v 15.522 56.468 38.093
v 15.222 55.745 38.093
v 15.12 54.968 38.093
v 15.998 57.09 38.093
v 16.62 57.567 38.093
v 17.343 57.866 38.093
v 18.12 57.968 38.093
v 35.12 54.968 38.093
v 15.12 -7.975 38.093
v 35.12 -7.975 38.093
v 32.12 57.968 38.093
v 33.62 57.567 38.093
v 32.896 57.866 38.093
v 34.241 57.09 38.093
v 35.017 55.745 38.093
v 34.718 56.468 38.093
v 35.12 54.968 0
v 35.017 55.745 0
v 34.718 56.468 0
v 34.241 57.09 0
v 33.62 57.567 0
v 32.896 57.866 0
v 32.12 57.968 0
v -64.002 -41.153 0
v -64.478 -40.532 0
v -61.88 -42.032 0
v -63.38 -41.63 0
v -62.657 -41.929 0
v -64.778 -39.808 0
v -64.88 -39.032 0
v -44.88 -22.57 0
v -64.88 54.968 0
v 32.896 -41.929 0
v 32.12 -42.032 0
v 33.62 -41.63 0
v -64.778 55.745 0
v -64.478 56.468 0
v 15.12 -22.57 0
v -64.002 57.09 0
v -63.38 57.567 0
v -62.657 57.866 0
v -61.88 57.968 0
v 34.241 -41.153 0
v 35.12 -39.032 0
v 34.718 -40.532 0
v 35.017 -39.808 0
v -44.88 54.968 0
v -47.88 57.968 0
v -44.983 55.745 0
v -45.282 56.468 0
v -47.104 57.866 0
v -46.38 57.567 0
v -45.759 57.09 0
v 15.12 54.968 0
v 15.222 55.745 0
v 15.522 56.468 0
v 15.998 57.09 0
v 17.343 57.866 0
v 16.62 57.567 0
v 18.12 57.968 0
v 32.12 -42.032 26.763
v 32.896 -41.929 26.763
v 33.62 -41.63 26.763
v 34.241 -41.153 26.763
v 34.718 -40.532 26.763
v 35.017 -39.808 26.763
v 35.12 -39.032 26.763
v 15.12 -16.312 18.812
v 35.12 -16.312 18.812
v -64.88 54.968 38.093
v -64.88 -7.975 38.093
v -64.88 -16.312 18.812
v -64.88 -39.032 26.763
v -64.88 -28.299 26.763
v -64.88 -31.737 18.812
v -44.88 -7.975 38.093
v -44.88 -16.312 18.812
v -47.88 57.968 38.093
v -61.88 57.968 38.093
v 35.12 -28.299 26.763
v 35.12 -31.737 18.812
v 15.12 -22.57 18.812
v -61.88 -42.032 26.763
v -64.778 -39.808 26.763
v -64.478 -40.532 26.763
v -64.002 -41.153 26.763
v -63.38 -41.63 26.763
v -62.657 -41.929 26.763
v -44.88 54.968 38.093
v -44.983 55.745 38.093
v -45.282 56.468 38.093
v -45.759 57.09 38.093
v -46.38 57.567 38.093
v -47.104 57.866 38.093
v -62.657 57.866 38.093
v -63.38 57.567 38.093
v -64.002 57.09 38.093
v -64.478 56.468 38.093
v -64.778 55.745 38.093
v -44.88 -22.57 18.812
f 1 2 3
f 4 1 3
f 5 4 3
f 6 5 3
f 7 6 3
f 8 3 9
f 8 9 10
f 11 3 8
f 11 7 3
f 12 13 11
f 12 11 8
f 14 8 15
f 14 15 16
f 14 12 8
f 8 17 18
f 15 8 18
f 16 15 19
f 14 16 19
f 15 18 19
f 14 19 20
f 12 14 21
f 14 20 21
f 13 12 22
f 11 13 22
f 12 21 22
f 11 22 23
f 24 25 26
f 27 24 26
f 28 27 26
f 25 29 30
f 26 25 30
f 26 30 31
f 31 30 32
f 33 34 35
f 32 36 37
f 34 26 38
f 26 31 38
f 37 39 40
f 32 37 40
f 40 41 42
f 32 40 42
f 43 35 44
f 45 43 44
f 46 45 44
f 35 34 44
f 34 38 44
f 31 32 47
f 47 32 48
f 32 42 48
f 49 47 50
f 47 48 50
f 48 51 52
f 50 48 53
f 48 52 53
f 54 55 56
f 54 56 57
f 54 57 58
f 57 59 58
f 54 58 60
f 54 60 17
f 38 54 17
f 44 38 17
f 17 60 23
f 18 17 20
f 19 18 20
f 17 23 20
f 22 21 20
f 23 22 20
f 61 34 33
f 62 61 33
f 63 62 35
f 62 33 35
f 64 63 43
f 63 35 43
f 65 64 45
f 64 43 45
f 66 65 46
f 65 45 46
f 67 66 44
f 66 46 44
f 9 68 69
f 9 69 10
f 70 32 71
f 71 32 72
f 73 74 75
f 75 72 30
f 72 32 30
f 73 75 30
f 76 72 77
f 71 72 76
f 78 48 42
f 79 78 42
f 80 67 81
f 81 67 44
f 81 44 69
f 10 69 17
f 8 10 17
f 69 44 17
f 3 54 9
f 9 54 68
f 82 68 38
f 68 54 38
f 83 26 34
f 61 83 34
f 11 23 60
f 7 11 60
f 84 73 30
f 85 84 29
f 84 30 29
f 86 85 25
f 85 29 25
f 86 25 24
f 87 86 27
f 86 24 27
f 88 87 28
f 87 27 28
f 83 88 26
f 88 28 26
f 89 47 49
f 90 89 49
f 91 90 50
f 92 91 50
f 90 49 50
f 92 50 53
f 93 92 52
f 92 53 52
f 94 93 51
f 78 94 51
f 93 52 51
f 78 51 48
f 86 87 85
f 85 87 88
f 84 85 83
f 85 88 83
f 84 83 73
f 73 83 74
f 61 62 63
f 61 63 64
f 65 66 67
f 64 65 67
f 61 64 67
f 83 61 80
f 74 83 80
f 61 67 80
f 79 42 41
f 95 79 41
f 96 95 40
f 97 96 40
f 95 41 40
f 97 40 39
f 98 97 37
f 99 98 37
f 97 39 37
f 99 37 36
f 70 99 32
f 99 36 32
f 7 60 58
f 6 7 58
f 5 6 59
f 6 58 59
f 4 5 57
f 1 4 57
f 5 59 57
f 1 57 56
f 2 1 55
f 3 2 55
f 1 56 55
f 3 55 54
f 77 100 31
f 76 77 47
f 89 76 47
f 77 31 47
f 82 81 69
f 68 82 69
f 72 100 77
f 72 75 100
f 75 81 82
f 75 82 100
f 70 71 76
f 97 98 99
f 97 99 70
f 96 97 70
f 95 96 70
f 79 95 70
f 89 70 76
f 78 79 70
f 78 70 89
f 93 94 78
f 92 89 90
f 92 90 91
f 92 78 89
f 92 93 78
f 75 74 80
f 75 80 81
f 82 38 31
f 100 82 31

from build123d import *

# Parameters (mm, degrees)
F1_DEPTH = 38.09291
F3_DEPTH = 122.48907
F6_W     = 30.103382
F6_H     = 15.981055
F7_DEPTH = 76.09144


with BuildPart() as f1:
    # F0 (on Top) → F1 (new body)
    with BuildSketch(Plane.XY):
        with BuildLine():
            Line((-47.8804, 57.96845), (-61.8804, 57.96845))
            ThreePointArc((-61.8804, 57.96845), (-64.00172, 57.089771), (-64.8804, 54.96845))
            Line((-64.8804, 54.96845), (-64.8804, -39.03155))
            ThreePointArc((-64.8804, -39.03155), (-64.00172, -41.15287), (-61.8804, -42.03155))
            Line((-61.8804, -42.03155), (32.1196, -42.03155))
            ThreePointArc((32.1196, -42.03155), (34.240921, -41.15287), (35.1196, -39.03155))
            Line((35.1196, -39.03155), (35.1196, 54.96845))
            ThreePointArc((35.1196, 54.96845), (34.240921, 57.089771), (32.1196, 57.96845))
            Line((32.1196, 57.96845), (18.1196, 57.96845))
            ThreePointArc((18.1196, 57.96845), (15.99828, 57.089771), (15.1196, 54.96845))
            Line((15.1196, 54.96845), (15.1196, -22.569584))
            Line((15.1196, -22.569584), (-44.8804, -22.569584))
            Line((-44.8804, -22.569584), (-44.8804, 54.96845))
            ThreePointArc((-44.8804, 54.96845), (-45.759079, 57.089771), (-47.8804, 57.96845))
        make_face()
    extrude(amount=F1_DEPTH)


with BuildPart() as f3:
    # F2 (on Right) → F3 (new body)
    with BuildSketch(Plane.YZ):
        Polygon((-71.411475, 51.98656), (-86.8368, 51.98656), (-102.24022, 16.366137), (-86.814895, 16.366137), align=None)
    extrude(amount=F3_DEPTH)


with BuildPart() as f3_1:
    # F4: moved
    add(f3.part.moved(Location((-76.72278, 70.50282, 2.4462))))


with BuildPart() as f1_1:
    add(f1.part)

    # F5: cut F3
    add(f3_1.part, mode=Mode.SUBTRACT)


with BuildPart() as f7:
    # F6 (on Right) → F7 (new body, symmetric)
    with BuildSketch(Plane.YZ):
        with Locations((-78.402916, 34.753974)):
            Rectangle(F6_W, F6_H)
    extrude(amount=F7_DEPTH, both=True)


with BuildPart() as f7_1:
    # F8: moved
    add(f7.part.moved(Location((0, 44.64814, 0))))


with BuildPart() as f1_2:
    add(f1_1.part)

    # F9: cut F7
    add(f7_1.part, mode=Mode.SUBTRACT)


solid = f1_2.part
